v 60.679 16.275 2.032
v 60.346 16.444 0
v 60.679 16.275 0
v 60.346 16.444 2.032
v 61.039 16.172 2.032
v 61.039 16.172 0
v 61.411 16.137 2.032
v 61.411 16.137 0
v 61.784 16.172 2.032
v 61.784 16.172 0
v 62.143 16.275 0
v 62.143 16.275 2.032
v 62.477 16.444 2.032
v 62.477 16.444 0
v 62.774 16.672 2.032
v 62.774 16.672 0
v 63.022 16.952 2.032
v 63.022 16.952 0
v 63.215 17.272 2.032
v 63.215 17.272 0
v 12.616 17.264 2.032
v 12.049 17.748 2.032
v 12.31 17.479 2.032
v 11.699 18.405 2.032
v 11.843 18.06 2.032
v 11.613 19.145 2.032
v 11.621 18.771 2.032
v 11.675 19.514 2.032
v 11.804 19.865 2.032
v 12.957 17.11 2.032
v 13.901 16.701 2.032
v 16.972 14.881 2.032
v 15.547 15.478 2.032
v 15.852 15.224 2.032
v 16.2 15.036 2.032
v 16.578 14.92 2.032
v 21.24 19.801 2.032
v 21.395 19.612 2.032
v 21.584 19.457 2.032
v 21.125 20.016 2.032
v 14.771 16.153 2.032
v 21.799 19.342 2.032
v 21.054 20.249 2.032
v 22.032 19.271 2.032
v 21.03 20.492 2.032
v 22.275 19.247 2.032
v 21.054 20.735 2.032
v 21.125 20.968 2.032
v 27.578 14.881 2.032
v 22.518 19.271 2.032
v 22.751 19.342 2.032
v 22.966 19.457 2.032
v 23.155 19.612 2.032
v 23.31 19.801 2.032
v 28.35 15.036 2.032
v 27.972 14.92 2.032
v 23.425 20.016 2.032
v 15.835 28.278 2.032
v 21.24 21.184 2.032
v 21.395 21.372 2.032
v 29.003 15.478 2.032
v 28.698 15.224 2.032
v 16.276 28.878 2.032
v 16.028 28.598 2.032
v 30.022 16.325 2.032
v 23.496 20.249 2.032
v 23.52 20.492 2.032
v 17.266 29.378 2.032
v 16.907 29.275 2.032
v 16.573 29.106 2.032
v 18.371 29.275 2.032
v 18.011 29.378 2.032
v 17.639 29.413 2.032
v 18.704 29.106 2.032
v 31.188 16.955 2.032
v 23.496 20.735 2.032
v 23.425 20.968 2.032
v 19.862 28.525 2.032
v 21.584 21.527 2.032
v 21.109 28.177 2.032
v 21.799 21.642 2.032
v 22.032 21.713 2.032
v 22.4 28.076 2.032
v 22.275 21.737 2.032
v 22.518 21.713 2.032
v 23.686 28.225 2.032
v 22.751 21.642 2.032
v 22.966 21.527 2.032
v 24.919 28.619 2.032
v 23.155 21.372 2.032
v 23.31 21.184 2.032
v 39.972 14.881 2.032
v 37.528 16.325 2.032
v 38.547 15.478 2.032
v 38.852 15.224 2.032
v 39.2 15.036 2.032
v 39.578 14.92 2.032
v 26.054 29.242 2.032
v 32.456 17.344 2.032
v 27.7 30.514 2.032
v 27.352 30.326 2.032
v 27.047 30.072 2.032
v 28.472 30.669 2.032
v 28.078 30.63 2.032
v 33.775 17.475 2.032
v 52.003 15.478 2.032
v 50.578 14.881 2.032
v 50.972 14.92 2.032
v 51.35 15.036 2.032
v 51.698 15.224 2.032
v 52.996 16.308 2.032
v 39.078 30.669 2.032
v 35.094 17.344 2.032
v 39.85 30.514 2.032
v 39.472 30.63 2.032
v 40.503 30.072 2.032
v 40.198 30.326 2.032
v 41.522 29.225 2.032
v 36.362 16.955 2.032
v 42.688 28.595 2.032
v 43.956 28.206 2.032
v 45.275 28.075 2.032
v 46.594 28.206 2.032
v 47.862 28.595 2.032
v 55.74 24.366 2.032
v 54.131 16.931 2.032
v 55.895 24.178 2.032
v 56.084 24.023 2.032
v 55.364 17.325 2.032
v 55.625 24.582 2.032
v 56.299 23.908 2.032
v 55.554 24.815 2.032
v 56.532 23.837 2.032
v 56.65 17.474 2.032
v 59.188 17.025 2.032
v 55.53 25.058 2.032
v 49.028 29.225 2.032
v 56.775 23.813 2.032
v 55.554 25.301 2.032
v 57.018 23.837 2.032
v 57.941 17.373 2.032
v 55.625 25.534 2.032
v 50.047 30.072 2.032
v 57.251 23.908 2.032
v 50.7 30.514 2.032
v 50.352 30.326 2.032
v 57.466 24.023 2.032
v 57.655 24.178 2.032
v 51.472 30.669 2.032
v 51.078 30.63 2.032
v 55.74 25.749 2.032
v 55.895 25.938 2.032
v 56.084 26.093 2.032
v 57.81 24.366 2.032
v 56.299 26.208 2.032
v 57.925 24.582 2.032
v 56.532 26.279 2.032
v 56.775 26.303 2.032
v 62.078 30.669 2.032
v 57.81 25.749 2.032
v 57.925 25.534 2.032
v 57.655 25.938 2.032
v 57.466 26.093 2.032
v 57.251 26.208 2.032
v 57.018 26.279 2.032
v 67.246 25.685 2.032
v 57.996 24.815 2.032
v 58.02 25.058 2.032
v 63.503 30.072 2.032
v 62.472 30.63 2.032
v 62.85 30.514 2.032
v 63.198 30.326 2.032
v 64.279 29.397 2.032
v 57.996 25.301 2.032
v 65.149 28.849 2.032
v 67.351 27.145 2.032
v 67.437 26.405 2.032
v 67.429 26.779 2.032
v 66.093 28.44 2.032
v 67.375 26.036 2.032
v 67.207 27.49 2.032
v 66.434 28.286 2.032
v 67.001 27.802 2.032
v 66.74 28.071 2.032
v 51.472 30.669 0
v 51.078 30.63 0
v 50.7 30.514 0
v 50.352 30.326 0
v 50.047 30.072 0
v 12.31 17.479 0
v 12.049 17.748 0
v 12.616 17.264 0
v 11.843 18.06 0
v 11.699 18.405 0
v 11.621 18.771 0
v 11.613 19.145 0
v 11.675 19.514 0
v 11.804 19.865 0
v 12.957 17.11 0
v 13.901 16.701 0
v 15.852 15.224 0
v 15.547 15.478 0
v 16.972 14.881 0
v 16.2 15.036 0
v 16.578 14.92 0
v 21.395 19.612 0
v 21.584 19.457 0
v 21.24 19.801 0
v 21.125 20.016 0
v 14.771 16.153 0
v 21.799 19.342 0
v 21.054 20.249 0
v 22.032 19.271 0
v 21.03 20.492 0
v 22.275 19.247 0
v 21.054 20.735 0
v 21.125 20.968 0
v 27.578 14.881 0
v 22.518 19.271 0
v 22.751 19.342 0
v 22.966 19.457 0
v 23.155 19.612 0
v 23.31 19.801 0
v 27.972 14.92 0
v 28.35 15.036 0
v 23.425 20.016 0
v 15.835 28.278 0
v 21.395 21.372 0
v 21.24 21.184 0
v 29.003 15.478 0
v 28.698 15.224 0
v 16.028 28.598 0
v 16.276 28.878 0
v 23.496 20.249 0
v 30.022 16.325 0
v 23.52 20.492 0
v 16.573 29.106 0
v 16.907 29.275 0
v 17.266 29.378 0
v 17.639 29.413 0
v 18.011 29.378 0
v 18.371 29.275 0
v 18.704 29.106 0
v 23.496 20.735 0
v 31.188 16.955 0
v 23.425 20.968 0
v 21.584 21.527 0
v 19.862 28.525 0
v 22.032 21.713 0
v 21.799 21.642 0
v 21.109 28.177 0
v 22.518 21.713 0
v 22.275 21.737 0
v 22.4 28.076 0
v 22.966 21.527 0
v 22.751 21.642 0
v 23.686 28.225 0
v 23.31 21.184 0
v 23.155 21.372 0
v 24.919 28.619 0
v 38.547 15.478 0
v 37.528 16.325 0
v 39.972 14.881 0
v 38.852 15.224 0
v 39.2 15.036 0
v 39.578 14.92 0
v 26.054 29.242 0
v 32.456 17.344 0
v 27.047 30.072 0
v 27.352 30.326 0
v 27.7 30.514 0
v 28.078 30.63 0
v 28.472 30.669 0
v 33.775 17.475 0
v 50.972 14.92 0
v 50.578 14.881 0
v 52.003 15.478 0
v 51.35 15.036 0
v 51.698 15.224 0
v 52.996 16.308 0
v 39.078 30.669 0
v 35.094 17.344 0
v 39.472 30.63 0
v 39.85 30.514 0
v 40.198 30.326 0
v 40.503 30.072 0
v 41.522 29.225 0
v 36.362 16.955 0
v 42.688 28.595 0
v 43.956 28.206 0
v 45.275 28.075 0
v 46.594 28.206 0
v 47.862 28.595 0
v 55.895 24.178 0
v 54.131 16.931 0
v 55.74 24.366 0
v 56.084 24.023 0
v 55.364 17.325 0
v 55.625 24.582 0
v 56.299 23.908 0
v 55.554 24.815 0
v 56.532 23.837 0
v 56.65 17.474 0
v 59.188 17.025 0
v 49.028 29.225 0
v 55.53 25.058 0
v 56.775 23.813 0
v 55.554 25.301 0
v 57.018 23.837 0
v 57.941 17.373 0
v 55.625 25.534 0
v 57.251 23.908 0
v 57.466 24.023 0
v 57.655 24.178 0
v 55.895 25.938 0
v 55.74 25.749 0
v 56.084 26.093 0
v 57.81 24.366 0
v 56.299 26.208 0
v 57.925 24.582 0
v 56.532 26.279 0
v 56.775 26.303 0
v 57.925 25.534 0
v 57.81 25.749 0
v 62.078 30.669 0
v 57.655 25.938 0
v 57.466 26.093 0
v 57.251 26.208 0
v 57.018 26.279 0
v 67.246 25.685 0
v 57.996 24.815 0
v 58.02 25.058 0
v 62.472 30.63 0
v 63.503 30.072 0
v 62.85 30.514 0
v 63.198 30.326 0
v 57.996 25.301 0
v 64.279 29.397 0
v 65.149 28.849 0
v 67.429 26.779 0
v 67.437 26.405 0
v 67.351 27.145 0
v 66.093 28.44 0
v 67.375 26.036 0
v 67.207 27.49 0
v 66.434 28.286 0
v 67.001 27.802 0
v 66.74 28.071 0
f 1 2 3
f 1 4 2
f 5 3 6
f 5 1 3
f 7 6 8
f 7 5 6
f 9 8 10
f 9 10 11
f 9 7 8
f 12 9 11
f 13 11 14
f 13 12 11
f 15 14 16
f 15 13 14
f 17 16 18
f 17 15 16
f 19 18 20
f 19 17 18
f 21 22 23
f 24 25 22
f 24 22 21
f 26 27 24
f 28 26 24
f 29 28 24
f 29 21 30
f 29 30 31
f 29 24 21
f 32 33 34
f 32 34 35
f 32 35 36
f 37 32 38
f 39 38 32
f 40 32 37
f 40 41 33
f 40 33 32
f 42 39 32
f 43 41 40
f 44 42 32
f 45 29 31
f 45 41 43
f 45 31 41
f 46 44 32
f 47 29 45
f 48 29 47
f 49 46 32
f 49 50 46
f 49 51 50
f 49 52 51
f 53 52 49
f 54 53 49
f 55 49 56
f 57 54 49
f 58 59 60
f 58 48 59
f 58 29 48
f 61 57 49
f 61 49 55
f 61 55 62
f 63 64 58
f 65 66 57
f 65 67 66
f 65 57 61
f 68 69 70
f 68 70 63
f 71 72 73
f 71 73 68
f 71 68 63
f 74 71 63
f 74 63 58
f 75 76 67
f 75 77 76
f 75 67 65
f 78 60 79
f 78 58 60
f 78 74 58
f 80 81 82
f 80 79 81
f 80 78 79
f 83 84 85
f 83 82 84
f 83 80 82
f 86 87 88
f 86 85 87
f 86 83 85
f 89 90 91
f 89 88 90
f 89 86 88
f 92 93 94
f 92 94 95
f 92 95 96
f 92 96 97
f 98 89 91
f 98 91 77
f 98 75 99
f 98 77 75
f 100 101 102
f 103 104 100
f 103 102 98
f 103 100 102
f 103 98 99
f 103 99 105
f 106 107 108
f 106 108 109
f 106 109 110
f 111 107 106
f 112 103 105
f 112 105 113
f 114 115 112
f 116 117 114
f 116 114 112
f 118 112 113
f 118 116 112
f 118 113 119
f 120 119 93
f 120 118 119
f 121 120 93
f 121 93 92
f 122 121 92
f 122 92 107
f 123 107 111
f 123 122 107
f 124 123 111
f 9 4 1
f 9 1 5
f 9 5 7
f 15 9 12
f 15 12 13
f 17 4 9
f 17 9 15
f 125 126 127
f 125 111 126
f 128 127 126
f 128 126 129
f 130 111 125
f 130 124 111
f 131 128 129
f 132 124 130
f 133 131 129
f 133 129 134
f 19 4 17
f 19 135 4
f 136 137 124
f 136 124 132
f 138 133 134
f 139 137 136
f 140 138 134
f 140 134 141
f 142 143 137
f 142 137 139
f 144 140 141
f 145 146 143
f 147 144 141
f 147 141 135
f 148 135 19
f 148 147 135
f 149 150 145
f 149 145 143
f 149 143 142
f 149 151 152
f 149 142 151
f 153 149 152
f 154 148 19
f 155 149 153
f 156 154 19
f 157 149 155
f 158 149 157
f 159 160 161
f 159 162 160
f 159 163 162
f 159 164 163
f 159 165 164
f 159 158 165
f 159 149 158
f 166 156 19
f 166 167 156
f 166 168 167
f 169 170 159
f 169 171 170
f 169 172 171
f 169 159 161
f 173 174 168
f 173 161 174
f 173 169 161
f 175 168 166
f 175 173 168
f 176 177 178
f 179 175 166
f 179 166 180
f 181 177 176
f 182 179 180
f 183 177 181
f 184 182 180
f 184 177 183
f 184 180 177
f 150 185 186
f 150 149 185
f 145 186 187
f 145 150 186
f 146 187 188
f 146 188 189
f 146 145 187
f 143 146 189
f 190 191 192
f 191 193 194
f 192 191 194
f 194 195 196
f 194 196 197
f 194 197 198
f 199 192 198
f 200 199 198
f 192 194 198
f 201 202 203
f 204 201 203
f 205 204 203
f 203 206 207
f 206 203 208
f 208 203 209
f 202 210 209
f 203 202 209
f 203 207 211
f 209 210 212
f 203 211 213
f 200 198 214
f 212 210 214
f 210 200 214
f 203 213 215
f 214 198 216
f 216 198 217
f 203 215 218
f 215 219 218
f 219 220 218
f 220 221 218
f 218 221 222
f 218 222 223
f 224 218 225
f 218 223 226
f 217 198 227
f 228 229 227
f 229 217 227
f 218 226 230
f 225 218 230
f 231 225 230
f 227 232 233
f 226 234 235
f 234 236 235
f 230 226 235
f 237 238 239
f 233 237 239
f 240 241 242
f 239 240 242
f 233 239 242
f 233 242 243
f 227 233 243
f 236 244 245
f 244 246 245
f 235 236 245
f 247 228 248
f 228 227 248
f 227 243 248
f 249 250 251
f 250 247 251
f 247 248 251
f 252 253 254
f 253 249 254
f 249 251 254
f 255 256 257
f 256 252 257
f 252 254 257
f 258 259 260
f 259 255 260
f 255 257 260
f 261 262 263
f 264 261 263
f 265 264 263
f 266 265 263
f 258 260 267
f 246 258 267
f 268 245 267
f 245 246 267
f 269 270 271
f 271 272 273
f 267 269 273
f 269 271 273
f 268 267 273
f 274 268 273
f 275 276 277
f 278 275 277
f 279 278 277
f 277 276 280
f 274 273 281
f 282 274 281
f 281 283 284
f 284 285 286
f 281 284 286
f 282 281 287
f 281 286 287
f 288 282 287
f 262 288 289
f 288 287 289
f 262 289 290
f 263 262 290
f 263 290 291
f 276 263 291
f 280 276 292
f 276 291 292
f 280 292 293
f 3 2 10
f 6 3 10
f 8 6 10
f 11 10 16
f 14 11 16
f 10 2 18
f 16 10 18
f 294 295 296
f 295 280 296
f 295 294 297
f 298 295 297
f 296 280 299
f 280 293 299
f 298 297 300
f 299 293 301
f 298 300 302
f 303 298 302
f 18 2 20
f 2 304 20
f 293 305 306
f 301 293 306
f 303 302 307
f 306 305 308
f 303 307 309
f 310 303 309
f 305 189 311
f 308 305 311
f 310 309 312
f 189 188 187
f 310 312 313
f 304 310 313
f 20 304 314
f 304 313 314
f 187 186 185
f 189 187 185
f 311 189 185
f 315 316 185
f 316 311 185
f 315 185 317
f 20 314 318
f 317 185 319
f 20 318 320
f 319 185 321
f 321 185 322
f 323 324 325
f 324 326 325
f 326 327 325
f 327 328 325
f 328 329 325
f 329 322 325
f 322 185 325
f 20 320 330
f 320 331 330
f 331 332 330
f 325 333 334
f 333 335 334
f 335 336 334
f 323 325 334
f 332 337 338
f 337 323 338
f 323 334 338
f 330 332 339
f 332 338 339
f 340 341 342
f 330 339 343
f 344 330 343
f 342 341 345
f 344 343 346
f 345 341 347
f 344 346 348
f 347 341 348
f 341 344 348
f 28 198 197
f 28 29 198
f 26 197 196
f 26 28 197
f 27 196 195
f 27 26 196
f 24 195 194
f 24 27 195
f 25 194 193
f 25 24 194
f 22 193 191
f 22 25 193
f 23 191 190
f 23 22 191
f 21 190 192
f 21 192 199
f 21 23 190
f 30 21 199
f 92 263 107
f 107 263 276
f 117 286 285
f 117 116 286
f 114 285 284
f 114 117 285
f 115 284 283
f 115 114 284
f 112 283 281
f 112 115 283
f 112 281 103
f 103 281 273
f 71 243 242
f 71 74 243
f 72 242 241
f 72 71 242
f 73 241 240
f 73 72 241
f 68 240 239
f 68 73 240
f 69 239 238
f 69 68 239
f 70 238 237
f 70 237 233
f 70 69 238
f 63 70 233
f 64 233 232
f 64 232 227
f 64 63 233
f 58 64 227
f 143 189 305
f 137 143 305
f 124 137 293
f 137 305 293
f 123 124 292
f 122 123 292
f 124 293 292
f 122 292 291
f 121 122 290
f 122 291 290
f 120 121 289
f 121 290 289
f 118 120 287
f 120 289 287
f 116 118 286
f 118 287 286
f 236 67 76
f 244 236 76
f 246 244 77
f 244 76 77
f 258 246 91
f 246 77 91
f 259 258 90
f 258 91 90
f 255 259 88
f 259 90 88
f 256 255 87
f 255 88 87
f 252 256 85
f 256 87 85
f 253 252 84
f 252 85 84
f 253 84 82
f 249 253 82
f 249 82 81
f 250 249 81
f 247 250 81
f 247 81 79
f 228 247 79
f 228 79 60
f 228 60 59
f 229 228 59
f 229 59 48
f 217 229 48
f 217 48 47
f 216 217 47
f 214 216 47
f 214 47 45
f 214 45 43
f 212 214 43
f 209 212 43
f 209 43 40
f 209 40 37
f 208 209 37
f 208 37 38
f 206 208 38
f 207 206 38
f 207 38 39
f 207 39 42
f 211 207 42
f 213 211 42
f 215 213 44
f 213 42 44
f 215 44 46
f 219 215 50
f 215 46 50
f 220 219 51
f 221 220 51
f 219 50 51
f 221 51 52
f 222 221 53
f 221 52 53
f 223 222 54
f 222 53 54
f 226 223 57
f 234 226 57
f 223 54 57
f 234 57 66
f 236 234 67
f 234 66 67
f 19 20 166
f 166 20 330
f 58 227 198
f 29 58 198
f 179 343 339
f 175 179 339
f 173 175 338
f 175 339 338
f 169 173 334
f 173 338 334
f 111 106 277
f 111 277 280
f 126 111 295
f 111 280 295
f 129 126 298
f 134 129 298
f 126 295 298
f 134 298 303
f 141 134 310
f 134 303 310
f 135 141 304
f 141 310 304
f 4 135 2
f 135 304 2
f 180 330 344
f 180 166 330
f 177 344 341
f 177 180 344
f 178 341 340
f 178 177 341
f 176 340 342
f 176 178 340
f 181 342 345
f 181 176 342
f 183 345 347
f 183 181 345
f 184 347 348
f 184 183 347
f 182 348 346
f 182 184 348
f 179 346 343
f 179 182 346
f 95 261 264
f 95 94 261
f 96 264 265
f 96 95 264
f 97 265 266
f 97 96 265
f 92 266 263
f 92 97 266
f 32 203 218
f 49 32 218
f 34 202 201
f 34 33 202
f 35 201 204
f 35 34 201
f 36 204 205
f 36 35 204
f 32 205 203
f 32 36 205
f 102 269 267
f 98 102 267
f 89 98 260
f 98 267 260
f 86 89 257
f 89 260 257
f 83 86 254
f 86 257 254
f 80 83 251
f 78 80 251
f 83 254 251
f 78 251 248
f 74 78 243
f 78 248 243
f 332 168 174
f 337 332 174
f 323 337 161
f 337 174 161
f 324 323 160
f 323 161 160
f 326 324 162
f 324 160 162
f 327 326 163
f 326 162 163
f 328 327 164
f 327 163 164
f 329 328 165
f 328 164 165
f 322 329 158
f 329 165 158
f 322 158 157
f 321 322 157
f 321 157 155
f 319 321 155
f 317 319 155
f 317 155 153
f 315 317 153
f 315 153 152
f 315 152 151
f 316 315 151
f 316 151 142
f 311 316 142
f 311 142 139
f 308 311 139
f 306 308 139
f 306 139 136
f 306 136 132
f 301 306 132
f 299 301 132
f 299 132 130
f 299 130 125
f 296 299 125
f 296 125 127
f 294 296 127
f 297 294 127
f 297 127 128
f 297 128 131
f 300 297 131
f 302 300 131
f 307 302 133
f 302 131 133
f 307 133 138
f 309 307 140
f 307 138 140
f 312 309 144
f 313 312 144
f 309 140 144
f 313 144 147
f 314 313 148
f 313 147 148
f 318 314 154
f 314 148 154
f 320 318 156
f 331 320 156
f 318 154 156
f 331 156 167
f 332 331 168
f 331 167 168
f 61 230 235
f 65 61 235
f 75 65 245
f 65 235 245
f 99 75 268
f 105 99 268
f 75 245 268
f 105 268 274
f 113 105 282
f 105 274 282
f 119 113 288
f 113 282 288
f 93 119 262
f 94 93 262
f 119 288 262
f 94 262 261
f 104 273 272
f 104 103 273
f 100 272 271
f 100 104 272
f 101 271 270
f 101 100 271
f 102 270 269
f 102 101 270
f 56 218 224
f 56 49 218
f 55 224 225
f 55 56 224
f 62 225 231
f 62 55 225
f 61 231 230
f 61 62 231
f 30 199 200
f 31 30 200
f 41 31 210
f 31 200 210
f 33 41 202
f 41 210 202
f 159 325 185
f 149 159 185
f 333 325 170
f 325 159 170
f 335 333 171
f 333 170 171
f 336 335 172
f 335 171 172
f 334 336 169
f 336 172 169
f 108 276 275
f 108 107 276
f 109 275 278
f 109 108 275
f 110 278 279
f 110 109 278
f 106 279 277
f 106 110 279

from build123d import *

# Parameters (mm, degrees)
BOSS_EXTRUDE1_DEPTH = 2.032
FILLET1_R           = 2
SKETCH4_R           = 1.2446
CUT_EXTRUDE1_DEPTH  = 75.115872934


with BuildPart() as part:
    # Sketch3 → Boss-Extrude1 (new body)
    with BuildSketch(Plane.XY):
        with BuildLine():
            Line((62.980794963, 30.66873734), (50.569205037, 30.66873734))
            ThreePointArc((50.569205037, 30.66873734), (45.275, 28.075), (39.980794963, 30.66873734))
            Line((39.980794963, 30.66873734), (27.569205037, 30.66873734))
            ThreePointArc((27.569205037, 30.66873734), (22.275, 28.075), (16.980794963, 30.66873734))
            Line((16.980794963, 30.66873734), (10.658308864, 17.473983742))
            ThreePointArc((10.658308864, 17.473983742), (13.670205209, 16.817167392), (16.069205037, 14.88126266))
            Line((16.069205037, 14.88126266), (28.480794963, 14.88126266))
            ThreePointArc((28.480794963, 14.88126266), (33.775, 17.475), (39.069205037, 14.88126266))
            Line((39.069205037, 14.88126266), (51.480794963, 14.88126266))
            ThreePointArc((51.480794963, 14.88126266), (56.775, 17.475), (62.069205037, 14.88126266))
            Line((62.069205037, 14.88126266), (68.391691136, 28.076016258))
            ThreePointArc((68.391691136, 28.076016258), (65.379794791, 28.732832608), (62.980794963, 30.66873734))
        make_face()
    extrude(amount=BOSS_EXTRUDE1_DEPTH)

    # Fillet1
    fillet1_edges = [part.edges().sort_by_distance(p)[0] for p in [
        (68.391691136, 28.076016258, 1.016),
        (62.069205037, 14.88126266, 1.016),
        (51.480794963, 14.88126266, 1.016),
        (39.069205037, 14.88126266, 1.016),
        (28.480794963, 14.88126266, 1.016),
        (16.069205037, 14.88126266, 1.016),
        (10.658308864, 17.473983742, 1.016),
        (16.980794963, 30.66873734, 1.016),
        (27.569205037, 30.66873734, 1.016),
        (39.980794963, 30.66873734, 1.016),
        (50.569205037, 30.66873734, 1.016),
        (62.980794963, 30.66873734, 1.016),
    ]]
    fillet(fillet1_edges, radius=FILLET1_R)

    # Sketch4 → Cut-Extrude1 (cut, through all)
    with BuildSketch(Plane.XY.offset(2.032)):
        with Locations((22.275, 20.49206771)):
            Circle(SKETCH4_R)
        with Locations((56.775, 25.05793229)):
            Circle(SKETCH4_R)
    extrude(amount=-CUT_EXTRUDE1_DEPTH, mode=Mode.SUBTRACT)


solid = part.part
